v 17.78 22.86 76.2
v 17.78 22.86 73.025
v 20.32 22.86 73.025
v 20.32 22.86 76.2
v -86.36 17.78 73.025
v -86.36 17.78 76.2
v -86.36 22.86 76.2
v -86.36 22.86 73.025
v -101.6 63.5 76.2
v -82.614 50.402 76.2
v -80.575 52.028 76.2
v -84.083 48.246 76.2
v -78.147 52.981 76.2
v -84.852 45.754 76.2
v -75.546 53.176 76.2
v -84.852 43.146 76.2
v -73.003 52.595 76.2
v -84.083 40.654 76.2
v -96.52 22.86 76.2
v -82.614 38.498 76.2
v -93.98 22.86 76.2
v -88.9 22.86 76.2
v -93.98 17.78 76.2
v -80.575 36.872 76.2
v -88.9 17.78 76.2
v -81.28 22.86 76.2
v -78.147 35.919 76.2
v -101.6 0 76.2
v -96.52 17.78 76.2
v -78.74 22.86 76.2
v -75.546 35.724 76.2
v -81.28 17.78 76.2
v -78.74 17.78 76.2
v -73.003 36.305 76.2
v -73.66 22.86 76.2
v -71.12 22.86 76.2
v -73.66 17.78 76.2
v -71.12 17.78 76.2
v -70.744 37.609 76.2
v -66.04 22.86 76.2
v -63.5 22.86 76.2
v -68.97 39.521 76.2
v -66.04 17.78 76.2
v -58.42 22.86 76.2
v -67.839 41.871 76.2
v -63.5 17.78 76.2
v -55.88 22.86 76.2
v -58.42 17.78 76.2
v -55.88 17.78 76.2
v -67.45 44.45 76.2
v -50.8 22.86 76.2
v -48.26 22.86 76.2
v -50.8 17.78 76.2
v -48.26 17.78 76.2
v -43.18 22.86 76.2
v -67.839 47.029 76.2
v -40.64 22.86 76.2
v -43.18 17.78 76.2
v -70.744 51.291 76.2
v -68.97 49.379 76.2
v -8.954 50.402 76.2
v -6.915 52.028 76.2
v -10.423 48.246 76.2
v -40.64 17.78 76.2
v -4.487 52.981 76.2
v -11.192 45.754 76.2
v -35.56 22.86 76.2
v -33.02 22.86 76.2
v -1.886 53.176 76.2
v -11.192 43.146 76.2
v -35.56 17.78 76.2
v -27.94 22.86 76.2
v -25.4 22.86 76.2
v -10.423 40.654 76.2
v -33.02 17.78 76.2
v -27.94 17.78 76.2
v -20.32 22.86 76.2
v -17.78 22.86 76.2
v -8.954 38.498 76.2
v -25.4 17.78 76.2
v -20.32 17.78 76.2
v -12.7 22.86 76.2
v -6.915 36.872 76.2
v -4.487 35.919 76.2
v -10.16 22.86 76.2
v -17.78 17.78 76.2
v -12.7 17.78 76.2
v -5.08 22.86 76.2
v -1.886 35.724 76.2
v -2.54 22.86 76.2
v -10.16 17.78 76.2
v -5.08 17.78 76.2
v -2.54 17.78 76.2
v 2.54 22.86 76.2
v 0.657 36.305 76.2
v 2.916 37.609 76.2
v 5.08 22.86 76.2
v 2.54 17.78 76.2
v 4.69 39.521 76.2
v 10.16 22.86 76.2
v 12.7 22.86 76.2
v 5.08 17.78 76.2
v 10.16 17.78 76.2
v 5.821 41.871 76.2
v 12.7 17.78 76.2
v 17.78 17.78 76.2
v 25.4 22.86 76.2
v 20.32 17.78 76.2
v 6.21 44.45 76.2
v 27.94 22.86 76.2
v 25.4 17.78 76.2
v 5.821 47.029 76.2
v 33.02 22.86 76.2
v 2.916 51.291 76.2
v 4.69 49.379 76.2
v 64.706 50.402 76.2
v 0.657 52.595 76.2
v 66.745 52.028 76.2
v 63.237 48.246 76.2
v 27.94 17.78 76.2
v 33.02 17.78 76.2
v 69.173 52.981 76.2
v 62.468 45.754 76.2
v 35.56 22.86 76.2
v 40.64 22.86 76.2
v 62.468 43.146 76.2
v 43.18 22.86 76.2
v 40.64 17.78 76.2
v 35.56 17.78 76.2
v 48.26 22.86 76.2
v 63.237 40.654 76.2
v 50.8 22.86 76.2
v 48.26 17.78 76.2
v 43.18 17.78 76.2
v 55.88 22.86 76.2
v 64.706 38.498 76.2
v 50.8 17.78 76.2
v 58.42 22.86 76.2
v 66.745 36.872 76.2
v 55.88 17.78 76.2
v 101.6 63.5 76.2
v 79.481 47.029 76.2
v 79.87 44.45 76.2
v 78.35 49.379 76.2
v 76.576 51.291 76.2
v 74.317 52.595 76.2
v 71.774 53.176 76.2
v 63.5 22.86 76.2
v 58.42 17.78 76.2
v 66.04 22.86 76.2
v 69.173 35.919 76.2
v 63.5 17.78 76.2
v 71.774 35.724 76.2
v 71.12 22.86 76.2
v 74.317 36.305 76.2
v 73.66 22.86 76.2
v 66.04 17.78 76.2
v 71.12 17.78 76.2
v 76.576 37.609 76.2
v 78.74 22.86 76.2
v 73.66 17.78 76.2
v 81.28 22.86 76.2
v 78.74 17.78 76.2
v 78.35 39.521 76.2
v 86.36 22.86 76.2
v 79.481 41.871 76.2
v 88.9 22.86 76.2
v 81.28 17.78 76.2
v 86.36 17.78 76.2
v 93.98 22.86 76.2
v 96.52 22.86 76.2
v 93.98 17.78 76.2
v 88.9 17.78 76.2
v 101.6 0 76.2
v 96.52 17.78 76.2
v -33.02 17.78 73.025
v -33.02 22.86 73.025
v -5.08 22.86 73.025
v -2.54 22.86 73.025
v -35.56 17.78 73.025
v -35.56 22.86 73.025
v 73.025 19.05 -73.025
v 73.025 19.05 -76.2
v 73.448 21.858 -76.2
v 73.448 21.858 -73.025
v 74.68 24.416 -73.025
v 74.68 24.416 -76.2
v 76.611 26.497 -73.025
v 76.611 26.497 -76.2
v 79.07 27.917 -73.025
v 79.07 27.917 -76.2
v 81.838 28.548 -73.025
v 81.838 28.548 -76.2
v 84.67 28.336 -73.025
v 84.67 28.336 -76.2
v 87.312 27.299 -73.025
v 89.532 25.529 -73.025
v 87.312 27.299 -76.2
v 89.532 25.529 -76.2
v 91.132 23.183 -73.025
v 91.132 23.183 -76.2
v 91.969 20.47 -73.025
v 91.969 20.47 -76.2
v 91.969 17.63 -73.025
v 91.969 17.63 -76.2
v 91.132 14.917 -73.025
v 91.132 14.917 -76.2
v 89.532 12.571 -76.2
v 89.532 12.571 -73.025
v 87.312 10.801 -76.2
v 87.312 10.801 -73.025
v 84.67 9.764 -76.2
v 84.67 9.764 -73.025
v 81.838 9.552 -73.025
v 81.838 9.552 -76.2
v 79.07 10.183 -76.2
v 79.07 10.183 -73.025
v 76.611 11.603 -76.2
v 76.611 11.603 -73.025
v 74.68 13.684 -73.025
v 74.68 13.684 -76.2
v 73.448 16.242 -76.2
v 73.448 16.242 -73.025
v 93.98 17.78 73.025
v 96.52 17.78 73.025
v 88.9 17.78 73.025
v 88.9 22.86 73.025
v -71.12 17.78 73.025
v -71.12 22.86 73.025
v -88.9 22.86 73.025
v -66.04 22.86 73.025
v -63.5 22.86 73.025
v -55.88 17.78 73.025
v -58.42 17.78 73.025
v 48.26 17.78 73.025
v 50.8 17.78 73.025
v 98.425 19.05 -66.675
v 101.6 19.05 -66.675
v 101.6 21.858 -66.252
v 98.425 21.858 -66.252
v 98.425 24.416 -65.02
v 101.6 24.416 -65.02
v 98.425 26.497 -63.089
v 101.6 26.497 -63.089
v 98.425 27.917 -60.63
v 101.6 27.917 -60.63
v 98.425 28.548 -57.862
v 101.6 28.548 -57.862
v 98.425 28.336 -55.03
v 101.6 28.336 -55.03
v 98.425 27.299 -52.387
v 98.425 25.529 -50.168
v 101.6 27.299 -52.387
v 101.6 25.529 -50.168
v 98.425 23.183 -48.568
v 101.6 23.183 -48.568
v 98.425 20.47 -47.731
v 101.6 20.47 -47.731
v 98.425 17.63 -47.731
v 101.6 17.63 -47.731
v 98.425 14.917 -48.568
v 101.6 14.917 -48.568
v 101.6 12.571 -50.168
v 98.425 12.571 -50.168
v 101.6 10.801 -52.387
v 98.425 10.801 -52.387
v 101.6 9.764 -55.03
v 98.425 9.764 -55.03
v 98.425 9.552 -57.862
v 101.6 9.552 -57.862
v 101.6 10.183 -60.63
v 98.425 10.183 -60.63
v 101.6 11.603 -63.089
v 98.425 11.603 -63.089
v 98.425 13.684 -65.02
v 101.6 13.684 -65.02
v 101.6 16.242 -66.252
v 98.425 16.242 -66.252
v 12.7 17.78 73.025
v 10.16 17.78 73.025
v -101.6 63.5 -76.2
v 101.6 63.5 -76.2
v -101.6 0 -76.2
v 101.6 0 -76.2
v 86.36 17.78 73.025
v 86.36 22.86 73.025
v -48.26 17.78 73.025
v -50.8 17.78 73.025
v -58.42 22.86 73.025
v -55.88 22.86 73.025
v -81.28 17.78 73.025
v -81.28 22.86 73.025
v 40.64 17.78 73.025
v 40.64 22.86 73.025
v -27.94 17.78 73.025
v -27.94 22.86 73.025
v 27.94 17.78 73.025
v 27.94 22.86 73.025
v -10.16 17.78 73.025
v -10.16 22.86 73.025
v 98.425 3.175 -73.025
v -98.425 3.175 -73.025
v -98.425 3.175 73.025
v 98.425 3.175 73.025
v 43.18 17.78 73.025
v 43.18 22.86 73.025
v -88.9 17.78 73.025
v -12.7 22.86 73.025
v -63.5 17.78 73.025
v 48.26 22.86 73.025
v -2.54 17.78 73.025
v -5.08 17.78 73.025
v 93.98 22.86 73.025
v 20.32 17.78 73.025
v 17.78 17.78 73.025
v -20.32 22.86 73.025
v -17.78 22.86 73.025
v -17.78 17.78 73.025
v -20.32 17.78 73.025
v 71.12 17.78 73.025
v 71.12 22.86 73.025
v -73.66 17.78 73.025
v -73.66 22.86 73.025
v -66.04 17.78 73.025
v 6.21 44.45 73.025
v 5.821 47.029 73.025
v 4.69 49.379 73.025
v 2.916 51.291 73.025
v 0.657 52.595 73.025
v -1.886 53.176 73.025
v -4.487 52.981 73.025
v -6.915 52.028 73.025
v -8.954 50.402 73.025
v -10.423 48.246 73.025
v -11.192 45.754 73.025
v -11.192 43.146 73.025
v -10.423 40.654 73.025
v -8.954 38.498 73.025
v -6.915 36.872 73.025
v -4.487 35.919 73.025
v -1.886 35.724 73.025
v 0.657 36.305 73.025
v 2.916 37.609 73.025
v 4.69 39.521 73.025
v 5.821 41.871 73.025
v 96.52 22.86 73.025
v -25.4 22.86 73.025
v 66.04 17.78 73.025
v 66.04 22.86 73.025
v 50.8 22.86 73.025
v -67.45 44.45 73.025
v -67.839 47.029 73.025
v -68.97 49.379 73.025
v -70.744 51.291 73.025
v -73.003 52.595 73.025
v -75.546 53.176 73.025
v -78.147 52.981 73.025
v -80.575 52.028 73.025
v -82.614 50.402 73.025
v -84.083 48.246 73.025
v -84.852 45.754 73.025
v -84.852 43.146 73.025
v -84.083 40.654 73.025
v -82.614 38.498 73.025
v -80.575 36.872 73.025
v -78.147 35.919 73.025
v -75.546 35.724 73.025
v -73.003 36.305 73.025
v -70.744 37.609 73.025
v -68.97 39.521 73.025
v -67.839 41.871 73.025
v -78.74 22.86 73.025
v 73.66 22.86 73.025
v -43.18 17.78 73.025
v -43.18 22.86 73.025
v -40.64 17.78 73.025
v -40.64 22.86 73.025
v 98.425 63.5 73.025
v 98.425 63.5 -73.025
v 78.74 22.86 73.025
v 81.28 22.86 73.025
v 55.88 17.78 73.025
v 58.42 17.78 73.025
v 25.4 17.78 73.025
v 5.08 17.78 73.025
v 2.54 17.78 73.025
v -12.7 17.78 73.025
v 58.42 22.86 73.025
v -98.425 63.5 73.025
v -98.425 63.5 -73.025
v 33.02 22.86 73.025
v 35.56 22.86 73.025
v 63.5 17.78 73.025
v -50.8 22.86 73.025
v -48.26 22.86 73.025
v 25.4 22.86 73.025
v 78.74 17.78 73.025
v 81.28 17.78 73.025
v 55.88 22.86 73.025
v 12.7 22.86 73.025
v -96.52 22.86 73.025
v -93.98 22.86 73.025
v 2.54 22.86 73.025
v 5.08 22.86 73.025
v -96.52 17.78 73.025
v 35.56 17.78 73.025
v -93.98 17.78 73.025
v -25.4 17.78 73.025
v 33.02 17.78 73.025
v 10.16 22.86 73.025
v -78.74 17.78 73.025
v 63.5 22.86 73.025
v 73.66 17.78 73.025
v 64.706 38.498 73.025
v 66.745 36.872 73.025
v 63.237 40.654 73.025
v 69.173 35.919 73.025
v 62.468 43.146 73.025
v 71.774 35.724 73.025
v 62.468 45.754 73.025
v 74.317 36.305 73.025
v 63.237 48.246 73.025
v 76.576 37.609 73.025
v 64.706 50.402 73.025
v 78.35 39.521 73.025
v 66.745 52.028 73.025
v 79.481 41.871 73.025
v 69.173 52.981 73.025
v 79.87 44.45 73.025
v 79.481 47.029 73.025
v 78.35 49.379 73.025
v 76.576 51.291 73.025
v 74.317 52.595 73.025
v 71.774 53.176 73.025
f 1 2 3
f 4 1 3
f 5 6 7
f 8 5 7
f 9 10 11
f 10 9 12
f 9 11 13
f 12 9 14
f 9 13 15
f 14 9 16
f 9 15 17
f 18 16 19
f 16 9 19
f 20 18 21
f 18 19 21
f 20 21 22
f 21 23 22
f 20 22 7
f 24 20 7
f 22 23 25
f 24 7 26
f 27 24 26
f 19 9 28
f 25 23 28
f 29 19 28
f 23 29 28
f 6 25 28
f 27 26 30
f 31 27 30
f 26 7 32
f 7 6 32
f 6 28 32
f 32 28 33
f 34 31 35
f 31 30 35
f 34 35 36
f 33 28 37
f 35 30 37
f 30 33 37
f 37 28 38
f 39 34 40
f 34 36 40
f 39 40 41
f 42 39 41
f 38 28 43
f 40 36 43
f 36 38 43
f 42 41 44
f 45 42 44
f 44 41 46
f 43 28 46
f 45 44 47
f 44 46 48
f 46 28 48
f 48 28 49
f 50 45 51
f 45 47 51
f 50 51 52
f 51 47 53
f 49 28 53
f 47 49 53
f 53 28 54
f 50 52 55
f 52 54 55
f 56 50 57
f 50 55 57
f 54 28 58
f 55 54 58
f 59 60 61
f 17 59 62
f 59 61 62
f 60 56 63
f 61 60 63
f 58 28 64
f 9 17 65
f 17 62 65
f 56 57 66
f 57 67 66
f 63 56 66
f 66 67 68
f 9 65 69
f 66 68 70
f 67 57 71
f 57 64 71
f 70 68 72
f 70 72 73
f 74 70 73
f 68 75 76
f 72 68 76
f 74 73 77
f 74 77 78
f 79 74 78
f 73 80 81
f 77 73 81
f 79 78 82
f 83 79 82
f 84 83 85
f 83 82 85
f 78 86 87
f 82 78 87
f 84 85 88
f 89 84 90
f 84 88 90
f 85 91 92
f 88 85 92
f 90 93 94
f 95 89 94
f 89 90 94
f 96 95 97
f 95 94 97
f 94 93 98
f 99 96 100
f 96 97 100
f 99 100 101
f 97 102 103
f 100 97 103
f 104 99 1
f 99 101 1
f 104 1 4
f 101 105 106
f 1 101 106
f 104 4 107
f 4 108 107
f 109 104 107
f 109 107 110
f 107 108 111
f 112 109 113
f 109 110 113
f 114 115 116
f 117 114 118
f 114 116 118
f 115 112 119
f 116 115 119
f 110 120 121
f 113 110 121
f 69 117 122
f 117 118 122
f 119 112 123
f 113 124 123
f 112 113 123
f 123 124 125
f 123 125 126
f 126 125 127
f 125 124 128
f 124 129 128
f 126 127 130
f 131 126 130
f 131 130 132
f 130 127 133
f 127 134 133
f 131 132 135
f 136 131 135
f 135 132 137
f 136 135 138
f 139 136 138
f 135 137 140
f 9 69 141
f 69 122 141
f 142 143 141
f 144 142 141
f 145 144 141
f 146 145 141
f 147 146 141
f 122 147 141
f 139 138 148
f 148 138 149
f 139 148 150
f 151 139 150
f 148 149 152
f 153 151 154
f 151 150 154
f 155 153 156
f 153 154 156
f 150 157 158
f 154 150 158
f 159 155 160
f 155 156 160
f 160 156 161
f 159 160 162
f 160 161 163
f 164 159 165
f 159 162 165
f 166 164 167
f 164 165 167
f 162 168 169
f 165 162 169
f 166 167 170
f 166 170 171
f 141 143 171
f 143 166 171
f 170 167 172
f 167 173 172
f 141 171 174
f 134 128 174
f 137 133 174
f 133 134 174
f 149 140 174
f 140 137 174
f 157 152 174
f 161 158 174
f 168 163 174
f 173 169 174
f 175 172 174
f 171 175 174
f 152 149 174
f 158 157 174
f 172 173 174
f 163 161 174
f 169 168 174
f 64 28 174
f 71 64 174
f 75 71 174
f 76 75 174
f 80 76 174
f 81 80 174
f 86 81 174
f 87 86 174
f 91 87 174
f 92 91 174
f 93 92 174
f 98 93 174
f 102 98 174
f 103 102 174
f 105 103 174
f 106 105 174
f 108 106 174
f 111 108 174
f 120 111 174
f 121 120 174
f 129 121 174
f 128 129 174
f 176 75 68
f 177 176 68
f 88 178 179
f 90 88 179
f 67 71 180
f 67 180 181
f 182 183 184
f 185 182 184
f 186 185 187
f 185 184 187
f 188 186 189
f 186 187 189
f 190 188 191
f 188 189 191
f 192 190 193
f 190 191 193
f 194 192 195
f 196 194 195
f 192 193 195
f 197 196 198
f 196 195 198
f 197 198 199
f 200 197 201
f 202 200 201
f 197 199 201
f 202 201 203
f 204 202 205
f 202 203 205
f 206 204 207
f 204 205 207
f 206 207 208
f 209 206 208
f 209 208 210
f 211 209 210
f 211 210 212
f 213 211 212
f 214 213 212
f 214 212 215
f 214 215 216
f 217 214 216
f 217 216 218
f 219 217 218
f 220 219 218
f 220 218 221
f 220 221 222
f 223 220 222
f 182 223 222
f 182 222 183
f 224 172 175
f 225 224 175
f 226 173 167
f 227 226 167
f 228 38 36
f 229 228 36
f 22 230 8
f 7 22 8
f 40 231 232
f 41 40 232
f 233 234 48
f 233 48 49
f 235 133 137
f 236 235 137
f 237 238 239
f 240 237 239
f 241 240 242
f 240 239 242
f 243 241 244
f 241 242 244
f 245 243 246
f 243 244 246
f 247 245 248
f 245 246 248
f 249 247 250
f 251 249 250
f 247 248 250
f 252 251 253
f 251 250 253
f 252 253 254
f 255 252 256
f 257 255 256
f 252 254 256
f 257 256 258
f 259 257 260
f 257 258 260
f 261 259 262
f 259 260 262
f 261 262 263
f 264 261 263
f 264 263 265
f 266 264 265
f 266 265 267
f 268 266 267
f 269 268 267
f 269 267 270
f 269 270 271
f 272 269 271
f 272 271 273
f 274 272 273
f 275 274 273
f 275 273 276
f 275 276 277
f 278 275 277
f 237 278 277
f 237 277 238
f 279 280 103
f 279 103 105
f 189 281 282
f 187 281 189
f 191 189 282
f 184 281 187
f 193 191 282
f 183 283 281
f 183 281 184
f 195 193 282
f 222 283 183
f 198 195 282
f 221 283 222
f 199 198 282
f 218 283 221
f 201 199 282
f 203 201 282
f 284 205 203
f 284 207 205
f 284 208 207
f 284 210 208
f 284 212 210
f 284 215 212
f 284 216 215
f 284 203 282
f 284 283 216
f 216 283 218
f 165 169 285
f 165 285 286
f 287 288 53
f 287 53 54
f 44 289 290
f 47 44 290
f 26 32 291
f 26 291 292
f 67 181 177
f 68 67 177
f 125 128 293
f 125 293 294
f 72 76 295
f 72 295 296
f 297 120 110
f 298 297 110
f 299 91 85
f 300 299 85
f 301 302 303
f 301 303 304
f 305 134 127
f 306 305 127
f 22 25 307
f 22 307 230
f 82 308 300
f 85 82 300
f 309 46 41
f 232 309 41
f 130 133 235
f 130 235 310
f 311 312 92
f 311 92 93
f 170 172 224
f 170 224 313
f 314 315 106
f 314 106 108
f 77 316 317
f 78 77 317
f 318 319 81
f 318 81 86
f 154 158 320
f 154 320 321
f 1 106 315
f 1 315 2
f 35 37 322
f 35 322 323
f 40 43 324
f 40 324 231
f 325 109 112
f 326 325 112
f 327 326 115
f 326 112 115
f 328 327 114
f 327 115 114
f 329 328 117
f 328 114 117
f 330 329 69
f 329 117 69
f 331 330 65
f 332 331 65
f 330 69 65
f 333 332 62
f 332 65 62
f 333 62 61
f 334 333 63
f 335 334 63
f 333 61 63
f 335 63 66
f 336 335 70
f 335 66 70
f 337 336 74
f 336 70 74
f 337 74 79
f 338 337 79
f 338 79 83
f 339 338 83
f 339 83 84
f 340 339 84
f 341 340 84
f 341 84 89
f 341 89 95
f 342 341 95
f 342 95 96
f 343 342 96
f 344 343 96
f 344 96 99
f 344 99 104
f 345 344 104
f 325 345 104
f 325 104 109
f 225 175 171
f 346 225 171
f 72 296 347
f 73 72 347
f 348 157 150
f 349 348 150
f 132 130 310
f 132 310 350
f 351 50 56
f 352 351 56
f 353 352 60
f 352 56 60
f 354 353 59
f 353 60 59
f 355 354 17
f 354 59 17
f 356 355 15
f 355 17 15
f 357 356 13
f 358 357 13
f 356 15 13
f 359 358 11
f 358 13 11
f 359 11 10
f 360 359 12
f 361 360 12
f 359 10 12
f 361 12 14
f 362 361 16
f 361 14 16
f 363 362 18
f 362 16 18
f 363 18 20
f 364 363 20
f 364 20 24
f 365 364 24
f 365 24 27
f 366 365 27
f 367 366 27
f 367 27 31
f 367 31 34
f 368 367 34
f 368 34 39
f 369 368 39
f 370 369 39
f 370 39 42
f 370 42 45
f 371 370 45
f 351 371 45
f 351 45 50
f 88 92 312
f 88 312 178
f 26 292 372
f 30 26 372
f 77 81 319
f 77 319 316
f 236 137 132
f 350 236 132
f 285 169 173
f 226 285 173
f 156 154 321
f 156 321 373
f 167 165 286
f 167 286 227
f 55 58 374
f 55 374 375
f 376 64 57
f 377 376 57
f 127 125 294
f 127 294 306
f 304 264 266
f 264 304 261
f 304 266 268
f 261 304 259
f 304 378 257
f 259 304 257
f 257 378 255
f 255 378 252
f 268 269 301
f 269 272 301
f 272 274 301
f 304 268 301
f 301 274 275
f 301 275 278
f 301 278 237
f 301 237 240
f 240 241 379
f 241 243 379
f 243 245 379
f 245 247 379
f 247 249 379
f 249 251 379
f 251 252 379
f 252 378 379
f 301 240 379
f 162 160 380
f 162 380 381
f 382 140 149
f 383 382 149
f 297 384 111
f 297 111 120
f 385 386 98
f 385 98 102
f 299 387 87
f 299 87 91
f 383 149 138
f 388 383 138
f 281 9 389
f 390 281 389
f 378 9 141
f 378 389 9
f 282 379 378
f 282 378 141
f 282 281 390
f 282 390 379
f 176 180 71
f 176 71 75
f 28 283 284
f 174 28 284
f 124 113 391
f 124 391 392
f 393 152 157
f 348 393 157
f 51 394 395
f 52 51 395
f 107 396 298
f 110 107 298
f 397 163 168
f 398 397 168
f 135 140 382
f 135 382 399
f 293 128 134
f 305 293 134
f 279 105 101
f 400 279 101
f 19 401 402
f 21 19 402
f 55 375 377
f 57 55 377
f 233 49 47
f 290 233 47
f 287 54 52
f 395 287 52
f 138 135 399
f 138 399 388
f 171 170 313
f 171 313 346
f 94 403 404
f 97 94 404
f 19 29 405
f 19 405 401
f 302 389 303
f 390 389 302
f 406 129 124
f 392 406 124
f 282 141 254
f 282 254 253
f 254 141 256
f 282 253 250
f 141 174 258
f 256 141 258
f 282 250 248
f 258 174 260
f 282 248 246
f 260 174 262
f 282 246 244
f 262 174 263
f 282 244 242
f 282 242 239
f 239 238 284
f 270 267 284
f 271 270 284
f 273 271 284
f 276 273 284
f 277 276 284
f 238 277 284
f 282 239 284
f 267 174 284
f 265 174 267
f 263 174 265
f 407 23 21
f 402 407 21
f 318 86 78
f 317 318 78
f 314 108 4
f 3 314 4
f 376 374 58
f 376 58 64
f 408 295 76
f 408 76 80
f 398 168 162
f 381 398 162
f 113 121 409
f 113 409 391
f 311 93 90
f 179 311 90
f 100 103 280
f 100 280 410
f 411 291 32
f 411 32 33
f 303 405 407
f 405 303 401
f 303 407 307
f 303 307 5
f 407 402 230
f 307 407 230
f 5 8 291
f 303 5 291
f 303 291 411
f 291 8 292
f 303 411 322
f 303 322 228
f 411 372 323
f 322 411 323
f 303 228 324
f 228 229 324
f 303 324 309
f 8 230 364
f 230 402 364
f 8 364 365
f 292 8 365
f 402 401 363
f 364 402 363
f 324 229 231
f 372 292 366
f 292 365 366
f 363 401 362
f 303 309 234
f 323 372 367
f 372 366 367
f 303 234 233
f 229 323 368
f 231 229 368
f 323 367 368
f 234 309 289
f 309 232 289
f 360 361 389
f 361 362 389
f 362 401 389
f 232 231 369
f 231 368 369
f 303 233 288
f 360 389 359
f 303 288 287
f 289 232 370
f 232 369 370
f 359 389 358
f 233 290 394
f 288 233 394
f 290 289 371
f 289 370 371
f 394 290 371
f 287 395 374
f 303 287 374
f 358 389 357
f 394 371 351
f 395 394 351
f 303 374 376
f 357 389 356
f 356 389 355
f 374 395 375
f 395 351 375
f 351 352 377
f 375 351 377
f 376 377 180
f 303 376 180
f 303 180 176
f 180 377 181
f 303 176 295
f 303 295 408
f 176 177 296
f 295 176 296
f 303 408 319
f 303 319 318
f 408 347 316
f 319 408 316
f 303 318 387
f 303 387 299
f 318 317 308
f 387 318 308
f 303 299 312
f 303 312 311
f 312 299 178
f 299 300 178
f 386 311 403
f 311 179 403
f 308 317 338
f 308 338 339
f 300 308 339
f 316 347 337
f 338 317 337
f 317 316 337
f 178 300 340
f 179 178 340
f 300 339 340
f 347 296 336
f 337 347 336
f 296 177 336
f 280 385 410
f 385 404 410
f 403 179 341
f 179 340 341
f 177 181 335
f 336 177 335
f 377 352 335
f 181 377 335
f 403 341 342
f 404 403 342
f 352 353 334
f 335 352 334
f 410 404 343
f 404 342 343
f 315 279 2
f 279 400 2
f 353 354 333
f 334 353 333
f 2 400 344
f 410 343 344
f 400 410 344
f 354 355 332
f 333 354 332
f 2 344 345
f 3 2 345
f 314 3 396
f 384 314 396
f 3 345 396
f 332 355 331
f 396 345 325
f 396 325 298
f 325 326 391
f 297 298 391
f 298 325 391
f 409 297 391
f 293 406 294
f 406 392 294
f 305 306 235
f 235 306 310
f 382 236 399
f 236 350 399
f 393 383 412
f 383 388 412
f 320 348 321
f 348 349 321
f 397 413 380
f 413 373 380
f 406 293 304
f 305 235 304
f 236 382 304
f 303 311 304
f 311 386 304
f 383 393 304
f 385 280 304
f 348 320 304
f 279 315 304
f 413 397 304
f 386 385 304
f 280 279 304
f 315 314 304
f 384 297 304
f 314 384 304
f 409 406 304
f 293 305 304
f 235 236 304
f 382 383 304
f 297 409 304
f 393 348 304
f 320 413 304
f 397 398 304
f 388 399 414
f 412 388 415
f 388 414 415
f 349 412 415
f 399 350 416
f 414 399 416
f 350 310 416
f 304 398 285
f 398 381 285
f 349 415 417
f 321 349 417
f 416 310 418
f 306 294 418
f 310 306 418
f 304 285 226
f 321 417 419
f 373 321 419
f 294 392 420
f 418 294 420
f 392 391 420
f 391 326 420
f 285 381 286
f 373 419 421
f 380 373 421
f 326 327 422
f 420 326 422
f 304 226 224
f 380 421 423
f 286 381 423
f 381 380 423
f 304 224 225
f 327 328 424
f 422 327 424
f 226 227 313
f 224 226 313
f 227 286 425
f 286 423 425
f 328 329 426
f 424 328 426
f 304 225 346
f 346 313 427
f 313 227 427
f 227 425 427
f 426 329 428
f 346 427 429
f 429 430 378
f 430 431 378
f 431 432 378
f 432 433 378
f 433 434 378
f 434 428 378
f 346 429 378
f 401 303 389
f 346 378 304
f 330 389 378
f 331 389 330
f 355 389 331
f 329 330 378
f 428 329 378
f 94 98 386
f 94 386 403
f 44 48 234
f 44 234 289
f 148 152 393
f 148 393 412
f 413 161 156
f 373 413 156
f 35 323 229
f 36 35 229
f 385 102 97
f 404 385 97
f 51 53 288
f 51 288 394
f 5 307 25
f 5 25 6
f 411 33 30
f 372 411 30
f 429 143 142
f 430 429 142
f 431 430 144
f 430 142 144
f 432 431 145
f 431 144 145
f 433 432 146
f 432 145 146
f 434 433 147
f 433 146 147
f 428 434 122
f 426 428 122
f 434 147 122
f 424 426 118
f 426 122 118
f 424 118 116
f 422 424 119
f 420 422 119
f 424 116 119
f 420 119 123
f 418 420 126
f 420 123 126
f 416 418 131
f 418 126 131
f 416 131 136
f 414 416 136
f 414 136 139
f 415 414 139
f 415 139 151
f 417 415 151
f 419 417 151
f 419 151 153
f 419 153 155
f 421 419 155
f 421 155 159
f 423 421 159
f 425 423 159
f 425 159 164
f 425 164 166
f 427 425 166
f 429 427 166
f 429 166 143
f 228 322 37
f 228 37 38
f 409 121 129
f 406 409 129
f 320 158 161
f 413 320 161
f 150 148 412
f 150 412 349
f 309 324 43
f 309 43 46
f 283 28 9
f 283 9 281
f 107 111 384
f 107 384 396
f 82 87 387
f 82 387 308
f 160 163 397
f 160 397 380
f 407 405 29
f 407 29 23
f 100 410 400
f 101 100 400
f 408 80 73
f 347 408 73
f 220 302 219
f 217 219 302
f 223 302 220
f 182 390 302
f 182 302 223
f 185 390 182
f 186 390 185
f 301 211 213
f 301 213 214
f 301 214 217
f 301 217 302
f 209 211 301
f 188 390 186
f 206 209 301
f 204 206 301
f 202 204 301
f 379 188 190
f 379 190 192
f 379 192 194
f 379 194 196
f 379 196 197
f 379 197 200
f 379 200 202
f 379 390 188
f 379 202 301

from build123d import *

# Parameters (mm, degrees)
SKETCH1_W           = 203.2
SKETCH1_H           = 152.4
BOSS_EXTRUDE1_DEPTH = 63.5
SKETCH2_W           = 196.85
SKETCH2_H           = 146.05
CUT_EXTRUDE1_DEPTH  = 60.325
SKETCH5_W           = 2.54
SKETCH5_H           = 5.08
CUT_EXTRUDE3_DEPTH  = 47.625
LPATTERN1_COUNT     = 26
LPATTERN1_PITCH     = 7.62
SKETCH6_R           = 8.75
CUT_EXTRUDE4_DEPTH  = 47.625
LPATTERN2_COUNT     = 3
LPATTERN2_PITCH     = 73.66
SKETCH7_R           = 9.525
CUT_EXTRUDE6_DEPTH  = 47.625
SKETCH8_R           = 9.525
CUT_EXTRUDE7_DEPTH  = 47.625


with BuildPart() as part:
    # Sketch1 → Boss-Extrude1 (new body)
    with BuildSketch(Plane(origin=(0, 0, 0), x_dir=(1, 0, 0), z_dir=(0, 1, 0))):
        Rectangle(SKETCH1_W, SKETCH1_H)
    extrude(amount=BOSS_EXTRUDE1_DEPTH)

    # Sketch2 → Cut-Extrude1 (cut)
    with BuildSketch(Plane(origin=(0, 63.5, 0), x_dir=(1, 0, 0), z_dir=(0, 1, 0))):
        Rectangle(SKETCH2_W, SKETCH2_H)
    extrude(amount=-CUT_EXTRUDE1_DEPTH, mode=Mode.SUBTRACT)

    # Sketch5 → Cut-Extrude3 (cut)
    with BuildSketch(Plane.XY.offset(76.2)):
        with Locations((-95.25, 20.32)):
            Rectangle(SKETCH5_W, SKETCH5_H)
    cut_extrude3 = extrude(amount=-CUT_EXTRUDE3_DEPTH, mode=Mode.SUBTRACT)

    # LPattern1: Cut-Extrude3 ×26
    with Locations(*[(i * LPATTERN1_PITCH, 0, 0) for i in range(1, LPATTERN1_COUNT)]):
        add(cut_extrude3, mode=Mode.SUBTRACT)

    # Sketch6 → Cut-Extrude4 (cut)
    with BuildSketch(Plane.XY.offset(76.2)):
        with Locations((-76.2, 44.45)):
            Circle(SKETCH6_R)
    cut_extrude4 = extrude(amount=-CUT_EXTRUDE4_DEPTH, mode=Mode.SUBTRACT)

    # LPattern2: Cut-Extrude4 ×3
    with Locations(*[(i * LPATTERN2_PITCH, 0, 0) for i in range(1, LPATTERN2_COUNT)]):
        add(cut_extrude4, mode=Mode.SUBTRACT)

    # Sketch7 → Cut-Extrude6 (cut)
    with BuildSketch(Plane(origin=(101.6, 0, 0), x_dir=(0, 0, -1), z_dir=(1, 0, 0))):
        with Locations((57.15, 19.05)):
            Circle(SKETCH7_R)
    extrude(amount=-CUT_EXTRUDE6_DEPTH, mode=Mode.SUBTRACT)

    # Sketch8 → Cut-Extrude7 (cut)
    with BuildSketch(Plane(origin=(0, 0, -76.2), x_dir=(-1, 0, 0), z_dir=(0, 0, -1))):
        with Locations((-82.55, 19.05)):
            Circle(SKETCH8_R)
    extrude(amount=-CUT_EXTRUDE7_DEPTH, mode=Mode.SUBTRACT)


solid = part.part
